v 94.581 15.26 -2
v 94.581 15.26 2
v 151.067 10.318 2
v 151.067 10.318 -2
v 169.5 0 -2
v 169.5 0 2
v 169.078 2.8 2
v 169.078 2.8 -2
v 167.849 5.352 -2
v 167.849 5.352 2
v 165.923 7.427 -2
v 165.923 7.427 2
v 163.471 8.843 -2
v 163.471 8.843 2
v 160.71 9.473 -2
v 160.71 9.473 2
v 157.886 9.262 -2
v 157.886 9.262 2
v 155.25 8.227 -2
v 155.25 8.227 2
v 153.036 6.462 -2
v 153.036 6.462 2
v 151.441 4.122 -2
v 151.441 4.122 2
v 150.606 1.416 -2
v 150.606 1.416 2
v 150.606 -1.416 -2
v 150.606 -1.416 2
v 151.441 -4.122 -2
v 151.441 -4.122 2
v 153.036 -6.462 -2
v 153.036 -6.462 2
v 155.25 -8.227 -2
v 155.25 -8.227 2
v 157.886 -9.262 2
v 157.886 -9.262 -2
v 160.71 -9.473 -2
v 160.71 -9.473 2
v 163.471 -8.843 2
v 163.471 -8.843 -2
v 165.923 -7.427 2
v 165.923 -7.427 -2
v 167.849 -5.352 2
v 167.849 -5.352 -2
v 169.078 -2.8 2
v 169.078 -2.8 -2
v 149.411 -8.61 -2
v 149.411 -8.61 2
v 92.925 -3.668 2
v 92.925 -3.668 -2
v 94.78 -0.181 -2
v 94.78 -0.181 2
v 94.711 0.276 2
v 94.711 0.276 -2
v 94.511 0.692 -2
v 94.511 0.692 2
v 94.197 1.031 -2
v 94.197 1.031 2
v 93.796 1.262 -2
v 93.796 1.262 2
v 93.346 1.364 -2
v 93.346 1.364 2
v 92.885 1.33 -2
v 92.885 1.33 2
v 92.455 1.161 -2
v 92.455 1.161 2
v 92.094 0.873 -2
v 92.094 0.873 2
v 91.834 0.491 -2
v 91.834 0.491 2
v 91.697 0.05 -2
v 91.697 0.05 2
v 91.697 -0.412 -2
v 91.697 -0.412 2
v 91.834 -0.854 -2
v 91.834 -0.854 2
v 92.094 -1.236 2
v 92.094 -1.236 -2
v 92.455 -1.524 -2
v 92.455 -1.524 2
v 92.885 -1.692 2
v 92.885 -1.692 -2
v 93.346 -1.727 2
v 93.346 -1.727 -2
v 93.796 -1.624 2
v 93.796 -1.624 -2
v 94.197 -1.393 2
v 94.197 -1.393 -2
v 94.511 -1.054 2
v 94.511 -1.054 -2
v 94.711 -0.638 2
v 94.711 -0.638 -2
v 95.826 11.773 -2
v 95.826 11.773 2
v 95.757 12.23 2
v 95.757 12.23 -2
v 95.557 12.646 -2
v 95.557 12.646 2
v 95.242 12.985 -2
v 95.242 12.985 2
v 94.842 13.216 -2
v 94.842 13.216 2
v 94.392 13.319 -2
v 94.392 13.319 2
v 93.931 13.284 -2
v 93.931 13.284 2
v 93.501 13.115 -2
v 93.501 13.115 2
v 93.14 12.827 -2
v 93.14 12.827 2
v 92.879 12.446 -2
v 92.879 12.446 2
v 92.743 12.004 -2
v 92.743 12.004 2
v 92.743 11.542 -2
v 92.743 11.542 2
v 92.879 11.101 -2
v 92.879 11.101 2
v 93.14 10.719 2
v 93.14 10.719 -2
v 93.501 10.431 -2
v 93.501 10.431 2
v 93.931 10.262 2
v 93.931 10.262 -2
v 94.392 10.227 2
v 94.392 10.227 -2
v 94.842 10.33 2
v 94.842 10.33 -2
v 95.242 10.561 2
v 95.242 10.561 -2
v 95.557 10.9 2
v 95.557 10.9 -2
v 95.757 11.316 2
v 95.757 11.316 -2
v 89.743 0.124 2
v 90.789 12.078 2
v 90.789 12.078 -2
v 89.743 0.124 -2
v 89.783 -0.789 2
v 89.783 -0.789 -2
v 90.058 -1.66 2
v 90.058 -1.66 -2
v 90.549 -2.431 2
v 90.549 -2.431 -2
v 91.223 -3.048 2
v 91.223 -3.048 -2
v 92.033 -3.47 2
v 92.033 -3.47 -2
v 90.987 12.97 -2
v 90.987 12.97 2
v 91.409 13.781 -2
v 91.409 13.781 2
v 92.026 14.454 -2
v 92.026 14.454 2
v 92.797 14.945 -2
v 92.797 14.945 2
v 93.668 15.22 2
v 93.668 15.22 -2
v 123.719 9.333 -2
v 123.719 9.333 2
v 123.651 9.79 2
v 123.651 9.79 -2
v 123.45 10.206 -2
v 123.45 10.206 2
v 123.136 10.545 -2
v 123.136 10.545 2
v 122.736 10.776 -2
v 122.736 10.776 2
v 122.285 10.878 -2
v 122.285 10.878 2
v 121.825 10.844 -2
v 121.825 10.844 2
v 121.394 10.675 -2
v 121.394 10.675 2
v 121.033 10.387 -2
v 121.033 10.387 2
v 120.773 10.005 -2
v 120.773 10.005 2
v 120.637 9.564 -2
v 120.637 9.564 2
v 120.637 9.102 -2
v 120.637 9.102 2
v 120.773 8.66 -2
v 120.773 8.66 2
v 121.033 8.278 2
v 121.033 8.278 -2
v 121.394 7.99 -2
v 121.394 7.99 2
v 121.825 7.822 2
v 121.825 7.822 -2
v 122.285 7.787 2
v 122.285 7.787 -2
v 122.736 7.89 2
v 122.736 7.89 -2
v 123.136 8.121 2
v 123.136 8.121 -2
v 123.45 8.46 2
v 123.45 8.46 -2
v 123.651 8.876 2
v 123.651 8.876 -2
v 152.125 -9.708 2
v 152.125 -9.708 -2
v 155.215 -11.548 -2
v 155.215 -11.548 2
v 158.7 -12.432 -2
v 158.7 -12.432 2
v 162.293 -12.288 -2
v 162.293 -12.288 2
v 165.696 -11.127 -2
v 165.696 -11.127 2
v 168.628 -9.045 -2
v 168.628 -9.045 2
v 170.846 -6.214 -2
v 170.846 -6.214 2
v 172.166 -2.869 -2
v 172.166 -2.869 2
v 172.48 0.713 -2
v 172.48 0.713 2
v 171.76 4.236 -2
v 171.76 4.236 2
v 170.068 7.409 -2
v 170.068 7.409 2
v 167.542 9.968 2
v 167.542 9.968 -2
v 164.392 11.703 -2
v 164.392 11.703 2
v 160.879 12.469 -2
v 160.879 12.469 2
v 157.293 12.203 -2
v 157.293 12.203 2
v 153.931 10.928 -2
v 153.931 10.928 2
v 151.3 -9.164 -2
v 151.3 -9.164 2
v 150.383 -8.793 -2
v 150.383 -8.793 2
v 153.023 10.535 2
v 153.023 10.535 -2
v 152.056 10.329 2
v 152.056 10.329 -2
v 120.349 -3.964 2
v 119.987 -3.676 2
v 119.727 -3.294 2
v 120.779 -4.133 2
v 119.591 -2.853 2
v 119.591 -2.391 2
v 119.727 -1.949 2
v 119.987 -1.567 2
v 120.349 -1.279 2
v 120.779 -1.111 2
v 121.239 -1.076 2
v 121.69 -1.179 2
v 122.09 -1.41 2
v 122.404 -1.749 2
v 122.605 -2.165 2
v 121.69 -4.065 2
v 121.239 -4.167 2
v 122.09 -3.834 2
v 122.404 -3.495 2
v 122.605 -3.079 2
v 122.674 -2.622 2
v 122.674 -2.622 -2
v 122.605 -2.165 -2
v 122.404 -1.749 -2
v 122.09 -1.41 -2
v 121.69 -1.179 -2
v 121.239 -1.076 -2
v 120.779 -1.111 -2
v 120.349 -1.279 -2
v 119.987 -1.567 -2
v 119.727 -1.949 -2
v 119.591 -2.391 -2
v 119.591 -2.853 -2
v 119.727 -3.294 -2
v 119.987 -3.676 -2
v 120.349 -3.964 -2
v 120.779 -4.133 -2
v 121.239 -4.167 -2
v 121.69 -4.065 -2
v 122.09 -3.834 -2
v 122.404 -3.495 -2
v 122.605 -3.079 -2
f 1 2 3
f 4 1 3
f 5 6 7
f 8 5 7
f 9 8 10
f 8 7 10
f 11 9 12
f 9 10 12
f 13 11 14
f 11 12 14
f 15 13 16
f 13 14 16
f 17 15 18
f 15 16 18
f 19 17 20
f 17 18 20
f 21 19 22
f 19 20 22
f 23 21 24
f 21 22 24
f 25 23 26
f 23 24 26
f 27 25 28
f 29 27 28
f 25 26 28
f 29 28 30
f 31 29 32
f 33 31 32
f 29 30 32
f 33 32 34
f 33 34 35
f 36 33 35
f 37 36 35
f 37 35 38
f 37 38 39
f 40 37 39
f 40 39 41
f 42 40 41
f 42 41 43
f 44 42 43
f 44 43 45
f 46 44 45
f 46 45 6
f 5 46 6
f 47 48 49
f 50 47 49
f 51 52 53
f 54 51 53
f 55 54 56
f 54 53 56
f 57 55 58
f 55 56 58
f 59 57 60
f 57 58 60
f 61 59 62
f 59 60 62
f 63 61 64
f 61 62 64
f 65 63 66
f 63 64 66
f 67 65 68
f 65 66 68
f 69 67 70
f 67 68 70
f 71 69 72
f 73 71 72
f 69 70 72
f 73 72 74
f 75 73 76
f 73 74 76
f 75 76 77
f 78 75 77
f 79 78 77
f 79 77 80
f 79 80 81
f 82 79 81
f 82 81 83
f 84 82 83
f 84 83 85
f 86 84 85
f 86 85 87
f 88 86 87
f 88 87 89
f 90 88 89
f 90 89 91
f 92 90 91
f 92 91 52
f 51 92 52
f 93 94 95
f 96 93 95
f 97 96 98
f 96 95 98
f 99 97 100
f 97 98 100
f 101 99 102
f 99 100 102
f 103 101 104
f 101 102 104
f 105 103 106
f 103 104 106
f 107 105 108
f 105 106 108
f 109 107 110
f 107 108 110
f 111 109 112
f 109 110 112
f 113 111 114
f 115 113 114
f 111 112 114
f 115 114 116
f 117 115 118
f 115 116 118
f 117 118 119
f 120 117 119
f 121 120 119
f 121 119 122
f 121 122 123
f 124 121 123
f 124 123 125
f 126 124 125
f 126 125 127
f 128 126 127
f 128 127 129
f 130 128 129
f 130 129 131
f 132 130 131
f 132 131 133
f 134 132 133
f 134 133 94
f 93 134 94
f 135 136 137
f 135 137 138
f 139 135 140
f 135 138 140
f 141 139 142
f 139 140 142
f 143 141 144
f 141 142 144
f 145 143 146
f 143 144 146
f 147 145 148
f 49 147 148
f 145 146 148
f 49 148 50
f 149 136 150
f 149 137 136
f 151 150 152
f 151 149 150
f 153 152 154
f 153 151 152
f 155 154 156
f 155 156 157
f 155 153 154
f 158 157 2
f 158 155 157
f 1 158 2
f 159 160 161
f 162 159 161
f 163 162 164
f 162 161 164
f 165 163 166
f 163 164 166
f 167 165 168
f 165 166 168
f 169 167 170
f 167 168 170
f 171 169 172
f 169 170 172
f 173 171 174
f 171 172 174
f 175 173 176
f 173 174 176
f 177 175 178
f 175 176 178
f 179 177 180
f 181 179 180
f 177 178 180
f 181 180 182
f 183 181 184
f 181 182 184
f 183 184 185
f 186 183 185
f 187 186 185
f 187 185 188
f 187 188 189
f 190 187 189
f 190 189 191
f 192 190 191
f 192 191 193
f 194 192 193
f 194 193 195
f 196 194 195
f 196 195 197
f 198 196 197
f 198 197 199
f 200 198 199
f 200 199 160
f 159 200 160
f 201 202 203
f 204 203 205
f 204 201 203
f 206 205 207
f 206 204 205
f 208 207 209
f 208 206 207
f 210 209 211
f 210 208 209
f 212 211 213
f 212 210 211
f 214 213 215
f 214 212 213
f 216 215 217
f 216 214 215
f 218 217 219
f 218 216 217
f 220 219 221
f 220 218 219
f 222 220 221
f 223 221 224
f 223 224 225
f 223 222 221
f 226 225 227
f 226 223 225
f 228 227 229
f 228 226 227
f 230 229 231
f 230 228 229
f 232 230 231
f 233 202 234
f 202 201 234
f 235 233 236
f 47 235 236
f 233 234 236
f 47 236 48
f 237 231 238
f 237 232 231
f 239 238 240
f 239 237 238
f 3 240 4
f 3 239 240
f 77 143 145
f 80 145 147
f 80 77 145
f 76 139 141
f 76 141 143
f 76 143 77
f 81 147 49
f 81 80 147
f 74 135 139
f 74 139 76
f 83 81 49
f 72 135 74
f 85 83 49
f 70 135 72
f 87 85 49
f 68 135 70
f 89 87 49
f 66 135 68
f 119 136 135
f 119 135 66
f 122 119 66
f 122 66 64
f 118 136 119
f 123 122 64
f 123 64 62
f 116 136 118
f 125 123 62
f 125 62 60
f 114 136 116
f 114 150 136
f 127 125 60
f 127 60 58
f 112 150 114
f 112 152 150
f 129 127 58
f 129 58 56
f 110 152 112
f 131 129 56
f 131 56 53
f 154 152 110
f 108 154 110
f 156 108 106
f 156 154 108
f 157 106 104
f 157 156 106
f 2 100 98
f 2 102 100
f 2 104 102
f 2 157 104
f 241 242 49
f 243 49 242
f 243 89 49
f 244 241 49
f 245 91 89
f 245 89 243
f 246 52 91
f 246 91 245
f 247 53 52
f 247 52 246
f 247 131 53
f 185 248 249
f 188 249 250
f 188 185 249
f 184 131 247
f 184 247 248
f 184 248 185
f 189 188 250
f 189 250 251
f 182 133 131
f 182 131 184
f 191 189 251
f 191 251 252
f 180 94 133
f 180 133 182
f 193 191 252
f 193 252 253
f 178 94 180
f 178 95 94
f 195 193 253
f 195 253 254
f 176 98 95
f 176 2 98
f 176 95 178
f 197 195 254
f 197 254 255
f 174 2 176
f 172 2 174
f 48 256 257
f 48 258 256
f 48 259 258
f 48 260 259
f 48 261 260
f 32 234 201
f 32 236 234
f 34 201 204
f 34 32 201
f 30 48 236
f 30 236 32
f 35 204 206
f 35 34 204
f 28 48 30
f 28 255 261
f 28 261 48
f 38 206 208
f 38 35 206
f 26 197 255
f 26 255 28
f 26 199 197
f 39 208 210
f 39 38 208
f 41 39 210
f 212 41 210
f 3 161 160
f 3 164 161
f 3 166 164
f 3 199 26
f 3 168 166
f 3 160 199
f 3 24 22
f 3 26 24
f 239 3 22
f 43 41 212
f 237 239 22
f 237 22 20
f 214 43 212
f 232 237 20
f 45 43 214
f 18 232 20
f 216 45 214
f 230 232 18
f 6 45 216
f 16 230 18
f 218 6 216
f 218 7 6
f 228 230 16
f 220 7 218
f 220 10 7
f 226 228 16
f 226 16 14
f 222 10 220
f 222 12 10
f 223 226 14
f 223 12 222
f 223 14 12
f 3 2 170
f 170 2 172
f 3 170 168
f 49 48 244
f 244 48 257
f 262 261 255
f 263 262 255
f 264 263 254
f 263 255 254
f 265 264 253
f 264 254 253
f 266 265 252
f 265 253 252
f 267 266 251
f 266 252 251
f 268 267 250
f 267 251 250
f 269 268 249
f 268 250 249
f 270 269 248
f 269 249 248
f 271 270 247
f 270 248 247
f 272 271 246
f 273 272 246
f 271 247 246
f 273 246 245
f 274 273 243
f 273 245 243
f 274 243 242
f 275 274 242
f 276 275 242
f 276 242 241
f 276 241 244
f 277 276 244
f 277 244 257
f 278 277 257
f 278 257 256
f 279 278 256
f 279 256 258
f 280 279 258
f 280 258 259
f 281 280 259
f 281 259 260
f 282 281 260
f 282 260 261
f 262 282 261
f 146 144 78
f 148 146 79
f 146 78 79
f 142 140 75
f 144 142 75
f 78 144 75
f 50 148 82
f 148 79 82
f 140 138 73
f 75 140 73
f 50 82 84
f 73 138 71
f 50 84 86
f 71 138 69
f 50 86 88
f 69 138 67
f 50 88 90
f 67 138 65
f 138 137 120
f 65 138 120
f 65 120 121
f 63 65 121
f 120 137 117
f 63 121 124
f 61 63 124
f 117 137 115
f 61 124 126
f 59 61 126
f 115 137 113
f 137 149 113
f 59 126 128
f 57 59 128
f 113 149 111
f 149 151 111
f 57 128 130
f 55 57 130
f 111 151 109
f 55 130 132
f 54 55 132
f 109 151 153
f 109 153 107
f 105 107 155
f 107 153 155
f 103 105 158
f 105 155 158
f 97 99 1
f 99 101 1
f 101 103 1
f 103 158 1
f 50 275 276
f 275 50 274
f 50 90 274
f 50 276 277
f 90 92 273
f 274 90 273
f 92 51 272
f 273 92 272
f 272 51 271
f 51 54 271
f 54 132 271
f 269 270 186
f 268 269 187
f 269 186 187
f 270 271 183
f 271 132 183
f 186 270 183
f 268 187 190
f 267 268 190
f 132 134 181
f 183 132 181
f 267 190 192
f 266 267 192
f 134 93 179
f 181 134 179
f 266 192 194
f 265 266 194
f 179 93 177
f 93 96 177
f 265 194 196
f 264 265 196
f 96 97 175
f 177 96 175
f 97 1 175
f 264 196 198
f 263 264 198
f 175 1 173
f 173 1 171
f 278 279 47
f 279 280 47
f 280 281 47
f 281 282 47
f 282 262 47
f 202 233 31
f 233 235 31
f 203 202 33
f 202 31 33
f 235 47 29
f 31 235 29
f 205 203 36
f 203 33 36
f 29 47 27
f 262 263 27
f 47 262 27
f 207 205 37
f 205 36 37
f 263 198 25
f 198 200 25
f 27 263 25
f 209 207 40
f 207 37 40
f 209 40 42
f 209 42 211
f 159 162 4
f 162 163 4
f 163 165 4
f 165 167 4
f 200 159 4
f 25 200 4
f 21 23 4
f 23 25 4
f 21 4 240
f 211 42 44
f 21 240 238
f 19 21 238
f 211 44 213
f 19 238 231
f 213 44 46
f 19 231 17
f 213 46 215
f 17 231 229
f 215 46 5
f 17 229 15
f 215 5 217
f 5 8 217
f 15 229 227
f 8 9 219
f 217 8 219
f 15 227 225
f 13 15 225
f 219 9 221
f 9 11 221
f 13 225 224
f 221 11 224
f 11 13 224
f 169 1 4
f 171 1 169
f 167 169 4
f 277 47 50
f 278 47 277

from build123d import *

# Parameters (mm, degrees)
SKETCH_1_R          = 6
EXTRUDE_1_DEPTH     = 2
SKETCH_2_R          = 1.55
SKETCH_2_R_2        = 0.6
CUT_EXTRUDE_1_DEPTH = 5
FILLET_1_R          = 3.5
SKETCH_3_OUTSIDE_W  = 217.41
SKETCH_3_OUTSIDE_H  = 71.355
CUT_EXTRUDE_2_DEPTH = 5
SKETCH_4_R          = 1.55
CUT_EXTRUDE_3_DEPTH = 5
FILLET_2_R          = 3.5
SKETCH_5_R          = 12.5
EXTRUDE_2_DEPTH     = 4
SKETCH_6_R          = 9.5
CUT_EXTRUDE_4_DEPTH = 5
FILLET_3_R          = 5


with BuildPart() as part:
    # 草图1 → 凸台-拉伸1 (new body, symmetric)
    with BuildSketch(Plane.XY):
        with BuildLine():
            Line((-8.927079897, 3.249191362), (-1.4961968, 23.665374879))
            Line((-1.4961968, 23.665374879), (160.827979556, 9.463849632))
            ThreePointArc((160.827979556, 9.463849632), (169.463849632, -0.827979556), (159.172020444, -9.463849632))
            Line((159.172020444, -9.463849632), (11.371578553, 3.467013498))
            Line((11.371578553, 3.467013498), (8.927079897, -3.249191362))
            ThreePointArc((8.927079897, -3.249191362), (-3.249191362, -8.927079897), (-8.927079897, 3.249191362))
        make_face()
        Circle(SKETCH_1_R, mode=Mode.SUBTRACT)
        with Locations((160, 0)):
            Circle(SKETCH_1_R, mode=Mode.SUBTRACT)
    extrude(amount=EXTRUDE_1_DEPTH, both=True)

    # 草图2 → 切除-拉伸1 (cut, through all)
    with BuildSketch(Plane.XY.offset(2)):
        with Locations((0.874182871, 19.944624098)):
            Circle(SKETCH_2_R)
        with Locations((16.220555377, 6.556152427)):
            Circle(SKETCH_2_R)
        with Locations((11.935394126, 3.261801412)):
            Circle(SKETCH_2_R_2)
    extrude(amount=-CUT_EXTRUDE_1_DEPTH, mode=Mode.SUBTRACT)

    # 圆角1
    fillet_1_edges = [part.edges().sort_by_distance(p)[0] for p in [
        (-1.4961968, 23.665374879, 0),
    ]]
    fillet(fillet_1_edges, radius=FILLET_1_R)

    # 草图3 outside → 切除-拉伸2 (cut, through all)
    with BuildSketch(Plane.XY.offset(2)):
        with Locations((80, 6.9725)):
            Rectangle(SKETCH_3_OUTSIDE_W, SKETCH_3_OUTSIDE_H)
        with BuildLine():
            Line((91.09435069, 15.564751624), (89.438391577, -3.36294764))
            Line((89.438391577, -3.36294764), (159.172020444, -9.463849632))
            ThreePointArc((159.172020444, -9.463849632), (169.463849632, -0.827979556), (160.827979556, 9.463849632))
            Line((160.827979556, 9.463849632), (91.09435069, 15.564751624))
        make_face(mode=Mode.SUBTRACT)
    extrude(amount=-CUT_EXTRUDE_2_DEPTH, mode=Mode.SUBTRACT)

    # 草图4 → 切除-拉伸3 (cut, through all)
    with BuildSketch(Plane.XY.offset(2)):
        with Locations((94.275987033, 11.773025081)):
            Circle(SKETCH_4_R)
        with Locations((93.23011812, -0.181311296)):
            Circle(SKETCH_4_R)
        with Locations((122.16943858, 9.332664284)):
            Circle(SKETCH_4_R)
        with Locations((121.123569667, -2.621672093)):
            Circle(SKETCH_4_R)
    extrude(amount=-CUT_EXTRUDE_3_DEPTH, mode=Mode.SUBTRACT)

    # 圆角2
    fillet_2_edges = [part.edges().sort_by_distance(p)[0] for p in [
        (89.438391577, -3.36294764, 0),
        (91.09435069, 15.564751624, 0),
    ]]
    fillet(fillet_2_edges, radius=FILLET_2_R)

    # 草图5 → 凸台-拉伸2 (add)
    with BuildSketch(Plane.XY.offset(2)):
        with Locations((160, 0)):
            Circle(SKETCH_5_R)
    extrude(amount=-EXTRUDE_2_DEPTH)

    # 草图6 → 切除-拉伸4 (cut, through all)
    with BuildSketch(Plane.XY.offset(2)):
        with Locations((160, 0)):
            Circle(SKETCH_6_R)
    extrude(amount=-CUT_EXTRUDE_4_DEPTH, mode=Mode.SUBTRACT)

    # 圆角3
    fillet_3_edges = [part.edges().sort_by_distance(p)[0] for p in [
        (152.73485557, 10.171906233, 0),
        (151.078896458, -8.755793031, 0),
    ]]
    fillet(fillet_3_edges, radius=FILLET_3_R)


solid = part.part
